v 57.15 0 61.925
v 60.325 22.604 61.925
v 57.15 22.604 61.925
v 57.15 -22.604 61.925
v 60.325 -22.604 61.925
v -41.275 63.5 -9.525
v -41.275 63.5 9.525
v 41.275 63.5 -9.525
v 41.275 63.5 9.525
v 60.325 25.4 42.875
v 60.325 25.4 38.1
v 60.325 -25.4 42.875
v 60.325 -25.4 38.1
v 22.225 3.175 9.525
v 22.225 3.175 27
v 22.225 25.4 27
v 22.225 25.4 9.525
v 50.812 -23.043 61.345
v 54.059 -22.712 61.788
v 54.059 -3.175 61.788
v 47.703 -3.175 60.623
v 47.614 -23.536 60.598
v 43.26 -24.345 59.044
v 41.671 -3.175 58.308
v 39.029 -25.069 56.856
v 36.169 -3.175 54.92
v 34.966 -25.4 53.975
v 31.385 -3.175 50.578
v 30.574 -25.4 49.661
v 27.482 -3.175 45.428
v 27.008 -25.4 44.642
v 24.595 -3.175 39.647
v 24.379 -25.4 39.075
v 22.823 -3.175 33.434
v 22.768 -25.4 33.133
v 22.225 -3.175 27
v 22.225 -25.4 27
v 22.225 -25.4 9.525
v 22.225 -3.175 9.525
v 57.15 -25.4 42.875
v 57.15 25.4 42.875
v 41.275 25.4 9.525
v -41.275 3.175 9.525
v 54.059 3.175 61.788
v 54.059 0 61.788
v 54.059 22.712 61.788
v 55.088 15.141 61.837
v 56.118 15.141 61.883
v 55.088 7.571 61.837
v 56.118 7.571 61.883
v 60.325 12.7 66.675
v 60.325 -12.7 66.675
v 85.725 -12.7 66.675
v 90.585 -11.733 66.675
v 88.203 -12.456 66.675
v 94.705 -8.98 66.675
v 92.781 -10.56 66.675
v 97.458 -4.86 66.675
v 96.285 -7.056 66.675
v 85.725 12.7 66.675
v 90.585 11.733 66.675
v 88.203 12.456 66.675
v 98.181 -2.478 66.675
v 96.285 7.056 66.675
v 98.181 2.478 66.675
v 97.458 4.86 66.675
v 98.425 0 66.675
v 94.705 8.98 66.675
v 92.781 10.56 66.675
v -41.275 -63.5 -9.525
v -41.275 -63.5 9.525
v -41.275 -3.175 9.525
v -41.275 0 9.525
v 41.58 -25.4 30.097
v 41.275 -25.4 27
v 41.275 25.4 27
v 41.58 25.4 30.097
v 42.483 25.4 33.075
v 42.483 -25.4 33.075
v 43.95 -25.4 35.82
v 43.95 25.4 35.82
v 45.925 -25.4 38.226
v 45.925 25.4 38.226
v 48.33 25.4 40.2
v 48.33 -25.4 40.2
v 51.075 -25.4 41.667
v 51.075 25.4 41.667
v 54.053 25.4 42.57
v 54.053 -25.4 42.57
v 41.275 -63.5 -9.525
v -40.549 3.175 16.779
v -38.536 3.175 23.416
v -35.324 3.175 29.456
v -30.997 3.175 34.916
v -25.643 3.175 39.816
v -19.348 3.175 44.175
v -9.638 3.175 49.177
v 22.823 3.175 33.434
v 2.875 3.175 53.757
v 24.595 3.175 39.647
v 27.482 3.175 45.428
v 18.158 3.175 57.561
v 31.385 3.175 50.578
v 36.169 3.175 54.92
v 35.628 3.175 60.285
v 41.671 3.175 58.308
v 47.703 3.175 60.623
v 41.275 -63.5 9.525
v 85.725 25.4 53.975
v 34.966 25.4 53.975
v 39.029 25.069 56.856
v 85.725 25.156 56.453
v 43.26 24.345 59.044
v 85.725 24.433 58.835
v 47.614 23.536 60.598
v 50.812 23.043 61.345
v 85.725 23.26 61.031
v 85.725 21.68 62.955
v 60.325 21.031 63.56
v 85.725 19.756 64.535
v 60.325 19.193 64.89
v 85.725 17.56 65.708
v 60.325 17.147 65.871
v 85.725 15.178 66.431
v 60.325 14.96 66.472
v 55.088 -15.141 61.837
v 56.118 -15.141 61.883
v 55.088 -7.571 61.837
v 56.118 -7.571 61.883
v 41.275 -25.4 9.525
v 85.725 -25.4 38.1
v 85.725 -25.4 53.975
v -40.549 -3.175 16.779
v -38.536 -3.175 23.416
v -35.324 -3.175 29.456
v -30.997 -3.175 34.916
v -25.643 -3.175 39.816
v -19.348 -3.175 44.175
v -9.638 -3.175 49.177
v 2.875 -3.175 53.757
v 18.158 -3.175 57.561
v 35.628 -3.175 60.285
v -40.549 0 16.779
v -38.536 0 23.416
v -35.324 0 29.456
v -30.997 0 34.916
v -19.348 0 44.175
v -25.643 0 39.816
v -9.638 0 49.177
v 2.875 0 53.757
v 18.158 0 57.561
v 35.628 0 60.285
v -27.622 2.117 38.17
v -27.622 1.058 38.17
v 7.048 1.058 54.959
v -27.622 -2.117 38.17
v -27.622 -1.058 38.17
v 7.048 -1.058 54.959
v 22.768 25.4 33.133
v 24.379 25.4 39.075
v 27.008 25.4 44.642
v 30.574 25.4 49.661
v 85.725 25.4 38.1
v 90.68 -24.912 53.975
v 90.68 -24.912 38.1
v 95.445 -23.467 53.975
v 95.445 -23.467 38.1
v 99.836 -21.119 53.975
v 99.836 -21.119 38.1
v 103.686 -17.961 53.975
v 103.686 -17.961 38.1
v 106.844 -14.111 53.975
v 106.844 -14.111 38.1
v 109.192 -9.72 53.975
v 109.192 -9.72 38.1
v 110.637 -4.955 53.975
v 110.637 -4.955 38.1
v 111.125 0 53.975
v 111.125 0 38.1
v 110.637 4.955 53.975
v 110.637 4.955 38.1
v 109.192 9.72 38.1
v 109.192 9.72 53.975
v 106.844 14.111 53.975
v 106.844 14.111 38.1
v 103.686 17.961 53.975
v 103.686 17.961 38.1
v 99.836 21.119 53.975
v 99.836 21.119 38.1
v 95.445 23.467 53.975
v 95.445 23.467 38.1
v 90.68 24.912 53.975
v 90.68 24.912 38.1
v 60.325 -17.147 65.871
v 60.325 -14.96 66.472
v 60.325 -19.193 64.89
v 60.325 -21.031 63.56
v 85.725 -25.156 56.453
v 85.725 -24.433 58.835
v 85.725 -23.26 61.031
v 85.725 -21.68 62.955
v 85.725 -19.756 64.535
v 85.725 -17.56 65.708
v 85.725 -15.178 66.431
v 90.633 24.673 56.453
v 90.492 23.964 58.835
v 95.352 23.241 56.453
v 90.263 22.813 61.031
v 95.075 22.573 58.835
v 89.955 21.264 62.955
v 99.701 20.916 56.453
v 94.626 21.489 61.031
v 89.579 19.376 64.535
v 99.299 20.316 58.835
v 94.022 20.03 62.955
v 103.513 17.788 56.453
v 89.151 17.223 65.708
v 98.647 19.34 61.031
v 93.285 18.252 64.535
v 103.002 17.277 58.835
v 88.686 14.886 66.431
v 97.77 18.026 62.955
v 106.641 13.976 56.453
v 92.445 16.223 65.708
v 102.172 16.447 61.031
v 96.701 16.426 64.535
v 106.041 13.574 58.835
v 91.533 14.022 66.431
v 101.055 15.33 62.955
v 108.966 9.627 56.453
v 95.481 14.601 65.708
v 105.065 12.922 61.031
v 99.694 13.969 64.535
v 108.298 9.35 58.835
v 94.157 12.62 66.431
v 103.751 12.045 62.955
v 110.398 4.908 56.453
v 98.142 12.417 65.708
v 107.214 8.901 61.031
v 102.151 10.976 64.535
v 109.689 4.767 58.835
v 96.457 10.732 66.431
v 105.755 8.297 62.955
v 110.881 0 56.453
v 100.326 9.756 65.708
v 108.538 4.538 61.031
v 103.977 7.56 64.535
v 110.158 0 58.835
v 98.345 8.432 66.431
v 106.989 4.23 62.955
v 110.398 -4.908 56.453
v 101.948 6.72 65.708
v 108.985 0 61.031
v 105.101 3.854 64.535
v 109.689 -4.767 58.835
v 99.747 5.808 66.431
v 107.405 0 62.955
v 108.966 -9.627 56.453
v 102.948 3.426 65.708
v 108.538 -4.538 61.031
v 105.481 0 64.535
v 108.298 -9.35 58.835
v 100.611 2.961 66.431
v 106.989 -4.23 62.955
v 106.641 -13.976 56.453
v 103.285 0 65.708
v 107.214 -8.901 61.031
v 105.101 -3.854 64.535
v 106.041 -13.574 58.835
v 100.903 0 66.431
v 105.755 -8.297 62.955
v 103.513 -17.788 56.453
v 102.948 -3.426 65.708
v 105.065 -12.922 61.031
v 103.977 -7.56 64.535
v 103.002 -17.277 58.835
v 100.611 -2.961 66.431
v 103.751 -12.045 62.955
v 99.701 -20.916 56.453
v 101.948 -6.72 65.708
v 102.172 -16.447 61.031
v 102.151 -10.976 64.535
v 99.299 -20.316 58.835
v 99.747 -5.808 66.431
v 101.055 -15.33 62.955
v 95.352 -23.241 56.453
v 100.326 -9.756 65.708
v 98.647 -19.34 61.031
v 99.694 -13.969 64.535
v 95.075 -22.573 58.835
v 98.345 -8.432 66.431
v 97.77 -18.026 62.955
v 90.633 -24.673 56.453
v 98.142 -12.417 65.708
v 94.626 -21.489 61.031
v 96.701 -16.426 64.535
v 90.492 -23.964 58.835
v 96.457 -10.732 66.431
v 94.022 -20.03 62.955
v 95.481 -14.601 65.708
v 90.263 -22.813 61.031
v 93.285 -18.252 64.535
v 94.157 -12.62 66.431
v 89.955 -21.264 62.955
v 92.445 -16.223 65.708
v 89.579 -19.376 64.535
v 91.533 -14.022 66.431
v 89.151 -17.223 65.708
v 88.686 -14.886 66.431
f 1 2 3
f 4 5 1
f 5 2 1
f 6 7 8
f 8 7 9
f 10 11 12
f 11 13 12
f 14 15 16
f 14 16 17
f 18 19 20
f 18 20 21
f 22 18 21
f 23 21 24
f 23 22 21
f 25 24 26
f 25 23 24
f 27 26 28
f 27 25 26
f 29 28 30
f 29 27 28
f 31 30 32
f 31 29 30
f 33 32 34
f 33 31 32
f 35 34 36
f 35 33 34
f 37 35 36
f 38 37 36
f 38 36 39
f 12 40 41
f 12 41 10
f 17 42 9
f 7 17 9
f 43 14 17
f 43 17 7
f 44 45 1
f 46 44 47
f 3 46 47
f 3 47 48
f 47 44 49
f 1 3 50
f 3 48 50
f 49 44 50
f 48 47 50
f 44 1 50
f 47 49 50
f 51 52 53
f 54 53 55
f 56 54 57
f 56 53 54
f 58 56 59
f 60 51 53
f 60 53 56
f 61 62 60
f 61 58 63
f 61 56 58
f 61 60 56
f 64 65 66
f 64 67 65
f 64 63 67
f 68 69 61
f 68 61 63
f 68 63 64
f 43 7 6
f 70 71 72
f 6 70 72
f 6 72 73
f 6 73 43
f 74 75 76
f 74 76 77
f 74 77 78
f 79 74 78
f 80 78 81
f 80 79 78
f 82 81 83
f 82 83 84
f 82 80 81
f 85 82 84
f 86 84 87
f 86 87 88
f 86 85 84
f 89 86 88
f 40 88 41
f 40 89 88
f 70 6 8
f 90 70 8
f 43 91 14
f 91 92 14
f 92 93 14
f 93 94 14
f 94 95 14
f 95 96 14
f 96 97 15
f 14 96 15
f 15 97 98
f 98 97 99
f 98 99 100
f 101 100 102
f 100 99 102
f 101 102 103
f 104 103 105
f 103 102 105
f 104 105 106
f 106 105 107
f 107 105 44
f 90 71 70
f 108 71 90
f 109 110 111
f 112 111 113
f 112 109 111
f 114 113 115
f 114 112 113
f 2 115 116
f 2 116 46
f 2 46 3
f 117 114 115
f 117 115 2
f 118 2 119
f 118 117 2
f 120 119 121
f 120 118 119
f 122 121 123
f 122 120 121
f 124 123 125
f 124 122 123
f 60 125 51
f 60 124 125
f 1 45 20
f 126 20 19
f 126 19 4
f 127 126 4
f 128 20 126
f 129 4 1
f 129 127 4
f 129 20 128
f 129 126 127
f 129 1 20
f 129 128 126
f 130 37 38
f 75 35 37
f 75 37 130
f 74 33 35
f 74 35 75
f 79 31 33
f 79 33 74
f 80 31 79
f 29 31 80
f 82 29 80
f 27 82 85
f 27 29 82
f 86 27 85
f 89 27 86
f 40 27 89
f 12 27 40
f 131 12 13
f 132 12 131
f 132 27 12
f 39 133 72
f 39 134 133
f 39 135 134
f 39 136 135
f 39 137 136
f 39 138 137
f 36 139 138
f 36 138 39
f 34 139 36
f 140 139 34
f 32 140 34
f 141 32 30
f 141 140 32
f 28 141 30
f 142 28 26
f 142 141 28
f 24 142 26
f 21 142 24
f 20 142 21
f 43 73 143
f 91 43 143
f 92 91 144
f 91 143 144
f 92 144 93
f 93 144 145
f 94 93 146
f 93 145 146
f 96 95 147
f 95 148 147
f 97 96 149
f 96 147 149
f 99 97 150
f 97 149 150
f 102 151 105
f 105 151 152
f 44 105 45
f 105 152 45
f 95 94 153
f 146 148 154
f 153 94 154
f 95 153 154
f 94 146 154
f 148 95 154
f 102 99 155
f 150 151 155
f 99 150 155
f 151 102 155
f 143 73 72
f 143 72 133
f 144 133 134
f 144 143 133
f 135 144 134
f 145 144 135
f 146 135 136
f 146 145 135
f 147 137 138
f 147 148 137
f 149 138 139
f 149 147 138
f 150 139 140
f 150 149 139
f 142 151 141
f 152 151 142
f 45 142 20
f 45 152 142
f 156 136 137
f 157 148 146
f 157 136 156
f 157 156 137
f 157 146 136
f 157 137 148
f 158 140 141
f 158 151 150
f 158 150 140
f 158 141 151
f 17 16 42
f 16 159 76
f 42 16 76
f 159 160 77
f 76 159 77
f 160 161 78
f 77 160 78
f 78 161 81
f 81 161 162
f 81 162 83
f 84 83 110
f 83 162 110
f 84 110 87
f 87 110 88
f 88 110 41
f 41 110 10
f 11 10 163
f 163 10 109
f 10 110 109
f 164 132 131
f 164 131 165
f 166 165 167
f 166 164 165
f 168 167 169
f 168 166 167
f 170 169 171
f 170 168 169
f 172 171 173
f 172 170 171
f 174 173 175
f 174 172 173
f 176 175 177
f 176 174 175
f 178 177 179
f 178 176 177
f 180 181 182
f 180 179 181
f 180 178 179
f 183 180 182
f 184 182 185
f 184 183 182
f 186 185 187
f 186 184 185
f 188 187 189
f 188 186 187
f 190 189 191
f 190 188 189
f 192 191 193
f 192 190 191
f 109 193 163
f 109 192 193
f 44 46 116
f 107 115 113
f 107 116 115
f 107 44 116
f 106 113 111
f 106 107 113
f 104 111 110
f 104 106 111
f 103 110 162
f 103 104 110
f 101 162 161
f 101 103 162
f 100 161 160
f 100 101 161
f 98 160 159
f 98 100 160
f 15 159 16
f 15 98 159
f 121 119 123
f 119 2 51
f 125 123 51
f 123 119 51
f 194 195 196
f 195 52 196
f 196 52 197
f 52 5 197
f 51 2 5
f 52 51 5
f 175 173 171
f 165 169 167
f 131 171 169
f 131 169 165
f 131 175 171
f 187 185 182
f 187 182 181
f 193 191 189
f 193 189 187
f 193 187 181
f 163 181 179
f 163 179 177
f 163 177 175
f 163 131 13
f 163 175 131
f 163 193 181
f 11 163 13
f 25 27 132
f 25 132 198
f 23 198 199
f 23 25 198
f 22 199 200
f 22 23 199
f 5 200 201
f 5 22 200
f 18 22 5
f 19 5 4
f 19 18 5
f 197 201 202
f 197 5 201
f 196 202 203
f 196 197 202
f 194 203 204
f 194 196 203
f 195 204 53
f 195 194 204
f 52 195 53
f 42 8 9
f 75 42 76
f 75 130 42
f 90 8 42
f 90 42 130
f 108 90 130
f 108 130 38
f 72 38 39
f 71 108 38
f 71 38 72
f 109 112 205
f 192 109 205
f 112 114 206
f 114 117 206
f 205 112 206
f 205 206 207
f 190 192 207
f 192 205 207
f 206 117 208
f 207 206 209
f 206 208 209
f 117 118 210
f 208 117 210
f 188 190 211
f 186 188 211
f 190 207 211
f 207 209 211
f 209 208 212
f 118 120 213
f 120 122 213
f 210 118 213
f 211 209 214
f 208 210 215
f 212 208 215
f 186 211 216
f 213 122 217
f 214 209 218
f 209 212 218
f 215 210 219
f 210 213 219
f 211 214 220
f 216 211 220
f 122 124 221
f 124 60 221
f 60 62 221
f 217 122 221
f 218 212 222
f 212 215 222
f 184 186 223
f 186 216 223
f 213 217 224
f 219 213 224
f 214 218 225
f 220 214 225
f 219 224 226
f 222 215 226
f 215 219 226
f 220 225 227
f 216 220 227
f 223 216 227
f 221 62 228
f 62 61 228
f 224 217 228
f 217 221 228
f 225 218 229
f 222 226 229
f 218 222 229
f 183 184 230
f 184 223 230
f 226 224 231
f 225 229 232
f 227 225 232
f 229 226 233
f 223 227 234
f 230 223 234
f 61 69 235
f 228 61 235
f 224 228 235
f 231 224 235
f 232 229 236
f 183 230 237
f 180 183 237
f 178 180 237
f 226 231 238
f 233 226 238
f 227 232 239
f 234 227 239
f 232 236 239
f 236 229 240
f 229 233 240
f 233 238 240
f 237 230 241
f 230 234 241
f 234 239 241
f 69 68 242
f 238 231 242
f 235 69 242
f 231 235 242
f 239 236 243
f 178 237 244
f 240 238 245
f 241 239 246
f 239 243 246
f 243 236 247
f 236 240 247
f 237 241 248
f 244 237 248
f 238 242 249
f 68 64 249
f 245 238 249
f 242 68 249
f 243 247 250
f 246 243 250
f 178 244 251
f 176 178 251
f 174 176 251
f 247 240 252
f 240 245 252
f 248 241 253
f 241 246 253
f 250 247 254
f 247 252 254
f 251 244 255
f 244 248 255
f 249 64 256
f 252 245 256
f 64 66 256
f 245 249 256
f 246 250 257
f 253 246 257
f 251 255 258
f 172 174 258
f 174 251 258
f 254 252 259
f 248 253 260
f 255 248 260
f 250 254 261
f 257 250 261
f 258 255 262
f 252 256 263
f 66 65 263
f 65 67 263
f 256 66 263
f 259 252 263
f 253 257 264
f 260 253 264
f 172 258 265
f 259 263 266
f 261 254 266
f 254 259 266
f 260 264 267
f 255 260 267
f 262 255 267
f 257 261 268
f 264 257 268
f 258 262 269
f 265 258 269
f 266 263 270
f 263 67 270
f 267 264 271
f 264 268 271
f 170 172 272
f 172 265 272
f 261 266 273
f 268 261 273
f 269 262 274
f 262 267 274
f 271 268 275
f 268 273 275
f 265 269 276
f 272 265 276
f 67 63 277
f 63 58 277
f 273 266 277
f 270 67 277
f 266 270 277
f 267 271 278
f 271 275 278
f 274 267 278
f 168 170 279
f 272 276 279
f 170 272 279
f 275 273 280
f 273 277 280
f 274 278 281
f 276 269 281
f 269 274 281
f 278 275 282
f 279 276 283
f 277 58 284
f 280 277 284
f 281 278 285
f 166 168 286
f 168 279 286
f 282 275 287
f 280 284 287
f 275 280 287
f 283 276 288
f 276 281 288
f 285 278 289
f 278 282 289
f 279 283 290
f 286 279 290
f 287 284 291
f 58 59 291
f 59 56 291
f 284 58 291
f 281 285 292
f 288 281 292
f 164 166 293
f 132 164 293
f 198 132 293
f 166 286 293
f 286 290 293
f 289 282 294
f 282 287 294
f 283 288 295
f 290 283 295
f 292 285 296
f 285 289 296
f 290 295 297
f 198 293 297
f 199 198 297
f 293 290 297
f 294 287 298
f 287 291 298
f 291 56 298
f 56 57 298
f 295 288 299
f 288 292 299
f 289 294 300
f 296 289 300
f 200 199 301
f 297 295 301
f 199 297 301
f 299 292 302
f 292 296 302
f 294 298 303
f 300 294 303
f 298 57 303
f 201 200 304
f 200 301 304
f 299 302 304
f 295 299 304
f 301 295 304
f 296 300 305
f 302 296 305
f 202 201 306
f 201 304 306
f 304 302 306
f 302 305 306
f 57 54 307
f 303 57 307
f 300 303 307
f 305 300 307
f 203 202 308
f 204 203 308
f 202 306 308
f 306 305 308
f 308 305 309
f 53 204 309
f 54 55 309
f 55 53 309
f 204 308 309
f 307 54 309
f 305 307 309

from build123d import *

# Parameters (mm, degrees)
F1_DEPTH = 63.5
F0_W     = 25.4
F0_H     = 19.05
F0_H_2   = 4.7498
F0_H_3   = 4.7752
F2_DEPTH = 25.4
F4_DEPTH = 3.175
F5_R     = 12.7


with BuildPart() as f1:
    # F0 (on Front) → F1 (new body, symmetric)
    with BuildSketch(Plane.XZ):
        Polygon((41.275, -9.525), (41.275, 9.525), (22.225, 9.525), (-41.275, 9.525), (-41.275, -9.525), align=None)
    extrude(amount=F1_DEPTH, both=True)

    # F0 (on Front) → F2 (join, symmetric)
    with BuildSketch(Plane.XZ):
        with BuildLine():
            Line((22.225, 9.525), (41.275, 9.525))
            Line((41.275, 9.525), (41.275, 27.0002))
            ThreePointArc((41.275, 27.0002), (45.9246798487, 38.2255201513), (57.15, 42.8752))
            Line((57.15, 42.8752), (60.325, 42.8752))
            Line((60.325, 42.8752), (60.325, 61.9252))
            Line((60.325, 61.9252), (57.15, 61.9252))
            add(Edge.make_bspline(
                [(54.0587441636, 61.7881255253), (55.0869767217, 61.838850256), (56.1175065912, 61.8845174455), (57.15, 61.9252)],
                knots=[109.2703067259, 109.2703067259, 109.2703067259, 109.2703067259, 111.5045361635, 111.5045361635, 111.5045361635, 111.5045361635], degree=3))
            ThreePointArc((54.0587441636, 61.7881255253), (31.3845411928, 50.5776629139), (22.225, 27.0002))
            Line((22.225, 27.0002), (22.225, 9.525))
        make_face()
        with Locations((73.025, 52.4002)):
            Rectangle(F0_W, F0_H)
        with Locations((73.025, 64.3001)):
            Rectangle(F0_W, F0_H_2)
        with Locations((73.025, 40.4876)):
            Rectangle(F0_W, F0_H_3)
    extrude(amount=F2_DEPTH, both=True)

    # F0 (on Front) → F3 (revolve)
    with BuildSketch(Plane.XZ):
        Polygon((85.725, 61.9252), (85.725, 42.8752), (85.725, 38.1), (111.125, 38.1), (111.125, 66.675), (85.725, 66.675), align=None)
    revolve(axis=Axis((85.725, 0, 52.3875), (0, 0, 1)))

    # F0 (on Front) → F4 (join, symmetric)
    with BuildSketch(Plane.XZ):
        with BuildLine():
            Line((-41.275, 9.525), (22.225, 9.525))
            Line((22.225, 9.525), (22.225, 27.0002))
            ThreePointArc((22.225, 27.0002), (31.3845411928, 50.5776629139), (54.0587441636, 61.7881255253))
            add(Edge.make_bspline(
                [(-41.275, 9.525), (-41.0225634855, 44.7292047169), (3.7705843511, 59.3073118764), (54.0587441636, 61.7881255253)],
                knots=[0, 0, 0, 0, 109.2703067259, 109.2703067259, 109.2703067259, 109.2703067259], degree=3))
        make_face()
    extrude(amount=F4_DEPTH, both=True)

    # F5
    f5_edges = [f1.edges().sort_by_distance(p)[0] for p in [
        (85.725, 25.4, 52.3875),
        (73.025, 25.4, 66.675),
        (73.025, -25.4, 66.675),
        (111.125, 0, 66.675),
    ]]
    fillet(f5_edges, radius=F5_R)


solid = f1.part
